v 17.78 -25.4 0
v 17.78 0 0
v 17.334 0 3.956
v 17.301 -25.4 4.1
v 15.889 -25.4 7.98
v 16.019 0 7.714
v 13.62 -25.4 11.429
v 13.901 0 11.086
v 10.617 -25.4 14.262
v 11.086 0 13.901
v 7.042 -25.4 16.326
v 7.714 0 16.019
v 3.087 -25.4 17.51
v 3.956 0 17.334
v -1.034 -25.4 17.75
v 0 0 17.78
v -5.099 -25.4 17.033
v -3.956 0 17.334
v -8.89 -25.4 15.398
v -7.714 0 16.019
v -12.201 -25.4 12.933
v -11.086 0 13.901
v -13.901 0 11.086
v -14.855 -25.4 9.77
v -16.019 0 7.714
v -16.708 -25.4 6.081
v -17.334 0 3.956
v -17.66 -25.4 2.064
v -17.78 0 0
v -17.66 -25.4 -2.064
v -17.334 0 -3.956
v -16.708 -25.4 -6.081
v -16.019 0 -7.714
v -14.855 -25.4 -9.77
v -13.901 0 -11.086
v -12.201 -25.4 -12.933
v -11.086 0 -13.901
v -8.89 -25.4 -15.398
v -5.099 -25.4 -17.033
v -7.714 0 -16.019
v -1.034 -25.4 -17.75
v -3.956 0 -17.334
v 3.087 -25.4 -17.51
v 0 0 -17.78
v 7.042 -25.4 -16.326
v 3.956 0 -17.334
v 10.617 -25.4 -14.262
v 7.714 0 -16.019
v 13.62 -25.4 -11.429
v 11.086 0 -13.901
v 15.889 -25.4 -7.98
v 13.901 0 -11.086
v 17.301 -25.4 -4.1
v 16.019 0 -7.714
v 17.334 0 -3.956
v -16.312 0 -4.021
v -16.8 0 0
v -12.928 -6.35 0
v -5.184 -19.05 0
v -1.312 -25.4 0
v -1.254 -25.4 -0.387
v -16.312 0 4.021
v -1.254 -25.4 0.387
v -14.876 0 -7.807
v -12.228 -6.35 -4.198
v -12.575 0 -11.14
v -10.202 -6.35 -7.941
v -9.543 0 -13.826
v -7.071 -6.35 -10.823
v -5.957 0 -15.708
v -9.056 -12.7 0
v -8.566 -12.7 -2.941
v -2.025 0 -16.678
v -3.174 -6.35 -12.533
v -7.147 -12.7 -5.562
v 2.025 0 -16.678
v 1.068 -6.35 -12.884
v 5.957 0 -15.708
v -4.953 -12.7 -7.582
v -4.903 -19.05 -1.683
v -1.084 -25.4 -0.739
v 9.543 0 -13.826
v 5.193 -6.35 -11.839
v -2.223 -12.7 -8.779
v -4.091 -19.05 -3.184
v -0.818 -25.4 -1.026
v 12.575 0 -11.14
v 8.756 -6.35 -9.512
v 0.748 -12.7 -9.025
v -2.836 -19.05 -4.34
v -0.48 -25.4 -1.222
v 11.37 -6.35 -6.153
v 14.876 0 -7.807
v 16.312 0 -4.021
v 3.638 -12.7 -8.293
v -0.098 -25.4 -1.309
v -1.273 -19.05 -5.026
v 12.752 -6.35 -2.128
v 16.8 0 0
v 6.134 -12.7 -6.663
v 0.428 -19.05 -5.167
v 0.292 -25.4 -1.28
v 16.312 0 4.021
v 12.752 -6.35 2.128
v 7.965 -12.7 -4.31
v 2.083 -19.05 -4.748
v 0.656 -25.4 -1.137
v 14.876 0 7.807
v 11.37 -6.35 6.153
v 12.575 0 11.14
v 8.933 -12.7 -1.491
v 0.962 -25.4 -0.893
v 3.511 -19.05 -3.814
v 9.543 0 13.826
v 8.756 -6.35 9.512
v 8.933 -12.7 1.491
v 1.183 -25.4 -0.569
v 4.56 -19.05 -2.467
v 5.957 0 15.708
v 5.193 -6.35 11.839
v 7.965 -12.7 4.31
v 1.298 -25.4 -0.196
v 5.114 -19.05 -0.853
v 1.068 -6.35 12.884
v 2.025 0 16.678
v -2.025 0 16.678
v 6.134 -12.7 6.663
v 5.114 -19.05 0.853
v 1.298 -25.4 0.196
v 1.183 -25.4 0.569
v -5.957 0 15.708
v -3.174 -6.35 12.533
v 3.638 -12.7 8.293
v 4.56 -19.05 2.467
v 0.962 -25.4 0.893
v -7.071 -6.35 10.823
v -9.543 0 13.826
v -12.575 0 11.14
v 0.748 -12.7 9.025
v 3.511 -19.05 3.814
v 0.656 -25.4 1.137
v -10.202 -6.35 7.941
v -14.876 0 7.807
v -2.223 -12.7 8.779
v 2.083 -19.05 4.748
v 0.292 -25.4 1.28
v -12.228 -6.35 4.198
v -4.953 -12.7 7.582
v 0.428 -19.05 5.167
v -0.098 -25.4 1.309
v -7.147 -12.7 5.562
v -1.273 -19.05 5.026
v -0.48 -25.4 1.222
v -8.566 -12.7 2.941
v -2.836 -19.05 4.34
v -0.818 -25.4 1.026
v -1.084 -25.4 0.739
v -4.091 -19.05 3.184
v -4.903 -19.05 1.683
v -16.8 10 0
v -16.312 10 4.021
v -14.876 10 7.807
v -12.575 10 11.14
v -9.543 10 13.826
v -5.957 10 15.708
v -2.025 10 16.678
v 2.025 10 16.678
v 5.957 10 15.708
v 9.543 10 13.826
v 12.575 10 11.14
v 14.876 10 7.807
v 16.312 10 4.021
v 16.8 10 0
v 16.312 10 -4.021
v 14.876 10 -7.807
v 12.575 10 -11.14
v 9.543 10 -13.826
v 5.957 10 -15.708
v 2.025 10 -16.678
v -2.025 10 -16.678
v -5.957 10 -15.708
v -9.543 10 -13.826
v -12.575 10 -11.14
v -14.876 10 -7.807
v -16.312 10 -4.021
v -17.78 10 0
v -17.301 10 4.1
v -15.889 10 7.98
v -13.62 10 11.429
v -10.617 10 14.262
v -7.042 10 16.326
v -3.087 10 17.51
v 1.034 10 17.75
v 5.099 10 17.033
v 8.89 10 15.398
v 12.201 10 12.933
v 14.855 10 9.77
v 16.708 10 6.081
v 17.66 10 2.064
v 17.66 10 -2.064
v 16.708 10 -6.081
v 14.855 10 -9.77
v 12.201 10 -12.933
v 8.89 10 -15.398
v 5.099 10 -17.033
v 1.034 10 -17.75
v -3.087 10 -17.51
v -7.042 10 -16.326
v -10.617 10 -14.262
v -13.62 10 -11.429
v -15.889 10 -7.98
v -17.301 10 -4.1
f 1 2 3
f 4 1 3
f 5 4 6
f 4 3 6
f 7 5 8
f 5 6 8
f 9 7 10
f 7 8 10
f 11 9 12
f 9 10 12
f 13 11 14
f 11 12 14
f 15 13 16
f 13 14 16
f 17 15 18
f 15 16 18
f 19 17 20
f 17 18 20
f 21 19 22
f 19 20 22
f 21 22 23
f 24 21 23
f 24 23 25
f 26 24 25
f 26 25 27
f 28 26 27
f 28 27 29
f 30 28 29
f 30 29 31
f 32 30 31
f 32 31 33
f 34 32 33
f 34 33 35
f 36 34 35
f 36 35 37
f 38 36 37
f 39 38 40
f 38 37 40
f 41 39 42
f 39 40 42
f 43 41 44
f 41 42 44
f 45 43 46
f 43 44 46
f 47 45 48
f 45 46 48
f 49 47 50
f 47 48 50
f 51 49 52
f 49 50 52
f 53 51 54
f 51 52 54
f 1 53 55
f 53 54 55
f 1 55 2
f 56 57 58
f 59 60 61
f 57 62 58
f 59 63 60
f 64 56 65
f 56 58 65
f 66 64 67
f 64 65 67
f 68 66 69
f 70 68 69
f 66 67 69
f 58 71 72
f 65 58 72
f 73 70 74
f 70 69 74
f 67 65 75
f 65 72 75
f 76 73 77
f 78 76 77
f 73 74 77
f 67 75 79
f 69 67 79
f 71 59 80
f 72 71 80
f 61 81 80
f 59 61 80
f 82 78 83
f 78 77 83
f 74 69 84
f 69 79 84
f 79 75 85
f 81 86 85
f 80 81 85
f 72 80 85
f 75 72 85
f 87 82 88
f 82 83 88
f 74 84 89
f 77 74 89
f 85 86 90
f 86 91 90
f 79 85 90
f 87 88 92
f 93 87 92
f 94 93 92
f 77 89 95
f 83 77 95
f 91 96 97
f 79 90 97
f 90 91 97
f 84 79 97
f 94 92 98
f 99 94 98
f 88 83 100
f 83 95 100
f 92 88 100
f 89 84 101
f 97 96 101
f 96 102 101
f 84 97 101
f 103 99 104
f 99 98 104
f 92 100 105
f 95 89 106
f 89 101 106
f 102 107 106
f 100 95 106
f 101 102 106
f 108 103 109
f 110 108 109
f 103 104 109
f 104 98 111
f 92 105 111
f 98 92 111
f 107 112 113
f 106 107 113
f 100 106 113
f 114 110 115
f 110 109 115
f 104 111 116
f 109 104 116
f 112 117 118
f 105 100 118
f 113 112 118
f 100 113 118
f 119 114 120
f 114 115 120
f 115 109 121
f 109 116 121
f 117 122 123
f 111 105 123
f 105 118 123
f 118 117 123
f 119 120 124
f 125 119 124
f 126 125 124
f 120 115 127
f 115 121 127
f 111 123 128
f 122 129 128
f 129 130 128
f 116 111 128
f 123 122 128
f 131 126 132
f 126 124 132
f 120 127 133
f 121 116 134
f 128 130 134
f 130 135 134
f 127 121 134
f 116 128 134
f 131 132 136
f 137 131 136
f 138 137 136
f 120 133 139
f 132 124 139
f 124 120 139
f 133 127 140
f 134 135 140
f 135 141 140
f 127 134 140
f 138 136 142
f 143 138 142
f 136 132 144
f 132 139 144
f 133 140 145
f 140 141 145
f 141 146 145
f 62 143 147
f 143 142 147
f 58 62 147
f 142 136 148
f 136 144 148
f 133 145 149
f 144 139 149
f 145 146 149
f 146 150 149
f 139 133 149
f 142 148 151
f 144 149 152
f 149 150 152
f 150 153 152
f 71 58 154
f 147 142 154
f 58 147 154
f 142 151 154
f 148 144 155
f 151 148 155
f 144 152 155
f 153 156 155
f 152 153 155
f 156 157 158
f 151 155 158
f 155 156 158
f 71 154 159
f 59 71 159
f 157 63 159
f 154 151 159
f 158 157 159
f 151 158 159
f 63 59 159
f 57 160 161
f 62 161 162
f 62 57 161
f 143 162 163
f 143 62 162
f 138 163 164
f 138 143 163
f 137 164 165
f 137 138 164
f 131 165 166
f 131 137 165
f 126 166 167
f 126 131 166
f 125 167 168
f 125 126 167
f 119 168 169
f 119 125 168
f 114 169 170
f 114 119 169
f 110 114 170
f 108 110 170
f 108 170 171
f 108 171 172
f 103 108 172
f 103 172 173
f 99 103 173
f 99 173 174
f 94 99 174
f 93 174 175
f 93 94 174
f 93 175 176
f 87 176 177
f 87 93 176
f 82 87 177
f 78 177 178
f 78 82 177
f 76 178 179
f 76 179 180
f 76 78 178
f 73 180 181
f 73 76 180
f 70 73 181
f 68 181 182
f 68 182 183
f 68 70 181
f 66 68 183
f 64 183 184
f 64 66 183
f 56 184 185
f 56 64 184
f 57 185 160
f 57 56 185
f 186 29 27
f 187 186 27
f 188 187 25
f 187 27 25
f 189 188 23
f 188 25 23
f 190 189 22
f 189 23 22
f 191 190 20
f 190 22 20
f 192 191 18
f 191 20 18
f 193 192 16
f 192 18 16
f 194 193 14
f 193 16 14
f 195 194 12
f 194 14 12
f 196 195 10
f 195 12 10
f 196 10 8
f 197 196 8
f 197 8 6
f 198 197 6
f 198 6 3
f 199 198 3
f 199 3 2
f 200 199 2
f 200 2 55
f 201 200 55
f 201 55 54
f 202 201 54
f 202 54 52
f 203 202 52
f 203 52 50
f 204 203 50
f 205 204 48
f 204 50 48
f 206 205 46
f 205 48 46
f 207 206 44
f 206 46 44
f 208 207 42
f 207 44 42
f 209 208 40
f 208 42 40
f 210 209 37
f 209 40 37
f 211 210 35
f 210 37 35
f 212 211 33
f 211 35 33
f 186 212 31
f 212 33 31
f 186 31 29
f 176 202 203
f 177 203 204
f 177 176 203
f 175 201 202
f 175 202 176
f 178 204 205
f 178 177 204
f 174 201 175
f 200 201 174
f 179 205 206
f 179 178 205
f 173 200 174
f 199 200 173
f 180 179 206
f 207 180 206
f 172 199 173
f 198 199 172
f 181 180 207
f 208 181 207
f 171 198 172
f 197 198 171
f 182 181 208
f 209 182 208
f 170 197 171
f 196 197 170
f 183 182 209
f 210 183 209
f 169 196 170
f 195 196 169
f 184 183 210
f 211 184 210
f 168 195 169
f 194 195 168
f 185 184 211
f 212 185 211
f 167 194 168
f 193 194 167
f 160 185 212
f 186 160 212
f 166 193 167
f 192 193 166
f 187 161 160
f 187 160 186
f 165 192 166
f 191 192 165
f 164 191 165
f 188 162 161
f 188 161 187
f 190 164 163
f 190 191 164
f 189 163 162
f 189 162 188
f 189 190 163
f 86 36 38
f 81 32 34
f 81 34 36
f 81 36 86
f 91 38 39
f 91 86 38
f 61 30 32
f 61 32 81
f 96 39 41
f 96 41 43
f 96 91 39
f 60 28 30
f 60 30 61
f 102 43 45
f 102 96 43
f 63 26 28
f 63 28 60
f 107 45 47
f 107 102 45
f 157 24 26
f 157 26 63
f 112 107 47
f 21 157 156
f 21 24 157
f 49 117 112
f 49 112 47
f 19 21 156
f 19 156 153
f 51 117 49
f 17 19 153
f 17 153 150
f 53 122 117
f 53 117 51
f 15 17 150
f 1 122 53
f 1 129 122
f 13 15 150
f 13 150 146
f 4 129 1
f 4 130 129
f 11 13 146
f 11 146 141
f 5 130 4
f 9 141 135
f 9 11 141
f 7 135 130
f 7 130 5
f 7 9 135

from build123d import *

# Parameters (mm, degrees)
F0_R     = 17.78
F1_DEPTH = 25.4
F4_R     = 17.78
F4_R_2   = 16.8
F5_DEPTH = 10


with BuildPart() as f1:
    # F0 (on Front) → F1 (new body)
    with BuildSketch(Plane.XZ):
        Circle(F0_R)
    extrude(amount=F1_DEPTH)

    # F2 (on Top) → F3 (revolve, cut)
    with BuildSketch(Plane.XY):
        Polygon((0, -25.4), (0, 0), (-16.8, 0), (-1.3125, -25.4), align=None)
    revolve(axis=Axis((0, -12.7, 0), (0, -1, 0)), mode=Mode.SUBTRACT)

    # F4 (on face) → F5 (join)
    with BuildSketch(Plane(origin=(0, 0, 0), x_dir=(-1, 0, 0), z_dir=(0, 1, 0))):
        Circle(F4_R)
        Circle(F4_R_2, mode=Mode.SUBTRACT)
    extrude(amount=F5_DEPTH)


solid = f1.part
